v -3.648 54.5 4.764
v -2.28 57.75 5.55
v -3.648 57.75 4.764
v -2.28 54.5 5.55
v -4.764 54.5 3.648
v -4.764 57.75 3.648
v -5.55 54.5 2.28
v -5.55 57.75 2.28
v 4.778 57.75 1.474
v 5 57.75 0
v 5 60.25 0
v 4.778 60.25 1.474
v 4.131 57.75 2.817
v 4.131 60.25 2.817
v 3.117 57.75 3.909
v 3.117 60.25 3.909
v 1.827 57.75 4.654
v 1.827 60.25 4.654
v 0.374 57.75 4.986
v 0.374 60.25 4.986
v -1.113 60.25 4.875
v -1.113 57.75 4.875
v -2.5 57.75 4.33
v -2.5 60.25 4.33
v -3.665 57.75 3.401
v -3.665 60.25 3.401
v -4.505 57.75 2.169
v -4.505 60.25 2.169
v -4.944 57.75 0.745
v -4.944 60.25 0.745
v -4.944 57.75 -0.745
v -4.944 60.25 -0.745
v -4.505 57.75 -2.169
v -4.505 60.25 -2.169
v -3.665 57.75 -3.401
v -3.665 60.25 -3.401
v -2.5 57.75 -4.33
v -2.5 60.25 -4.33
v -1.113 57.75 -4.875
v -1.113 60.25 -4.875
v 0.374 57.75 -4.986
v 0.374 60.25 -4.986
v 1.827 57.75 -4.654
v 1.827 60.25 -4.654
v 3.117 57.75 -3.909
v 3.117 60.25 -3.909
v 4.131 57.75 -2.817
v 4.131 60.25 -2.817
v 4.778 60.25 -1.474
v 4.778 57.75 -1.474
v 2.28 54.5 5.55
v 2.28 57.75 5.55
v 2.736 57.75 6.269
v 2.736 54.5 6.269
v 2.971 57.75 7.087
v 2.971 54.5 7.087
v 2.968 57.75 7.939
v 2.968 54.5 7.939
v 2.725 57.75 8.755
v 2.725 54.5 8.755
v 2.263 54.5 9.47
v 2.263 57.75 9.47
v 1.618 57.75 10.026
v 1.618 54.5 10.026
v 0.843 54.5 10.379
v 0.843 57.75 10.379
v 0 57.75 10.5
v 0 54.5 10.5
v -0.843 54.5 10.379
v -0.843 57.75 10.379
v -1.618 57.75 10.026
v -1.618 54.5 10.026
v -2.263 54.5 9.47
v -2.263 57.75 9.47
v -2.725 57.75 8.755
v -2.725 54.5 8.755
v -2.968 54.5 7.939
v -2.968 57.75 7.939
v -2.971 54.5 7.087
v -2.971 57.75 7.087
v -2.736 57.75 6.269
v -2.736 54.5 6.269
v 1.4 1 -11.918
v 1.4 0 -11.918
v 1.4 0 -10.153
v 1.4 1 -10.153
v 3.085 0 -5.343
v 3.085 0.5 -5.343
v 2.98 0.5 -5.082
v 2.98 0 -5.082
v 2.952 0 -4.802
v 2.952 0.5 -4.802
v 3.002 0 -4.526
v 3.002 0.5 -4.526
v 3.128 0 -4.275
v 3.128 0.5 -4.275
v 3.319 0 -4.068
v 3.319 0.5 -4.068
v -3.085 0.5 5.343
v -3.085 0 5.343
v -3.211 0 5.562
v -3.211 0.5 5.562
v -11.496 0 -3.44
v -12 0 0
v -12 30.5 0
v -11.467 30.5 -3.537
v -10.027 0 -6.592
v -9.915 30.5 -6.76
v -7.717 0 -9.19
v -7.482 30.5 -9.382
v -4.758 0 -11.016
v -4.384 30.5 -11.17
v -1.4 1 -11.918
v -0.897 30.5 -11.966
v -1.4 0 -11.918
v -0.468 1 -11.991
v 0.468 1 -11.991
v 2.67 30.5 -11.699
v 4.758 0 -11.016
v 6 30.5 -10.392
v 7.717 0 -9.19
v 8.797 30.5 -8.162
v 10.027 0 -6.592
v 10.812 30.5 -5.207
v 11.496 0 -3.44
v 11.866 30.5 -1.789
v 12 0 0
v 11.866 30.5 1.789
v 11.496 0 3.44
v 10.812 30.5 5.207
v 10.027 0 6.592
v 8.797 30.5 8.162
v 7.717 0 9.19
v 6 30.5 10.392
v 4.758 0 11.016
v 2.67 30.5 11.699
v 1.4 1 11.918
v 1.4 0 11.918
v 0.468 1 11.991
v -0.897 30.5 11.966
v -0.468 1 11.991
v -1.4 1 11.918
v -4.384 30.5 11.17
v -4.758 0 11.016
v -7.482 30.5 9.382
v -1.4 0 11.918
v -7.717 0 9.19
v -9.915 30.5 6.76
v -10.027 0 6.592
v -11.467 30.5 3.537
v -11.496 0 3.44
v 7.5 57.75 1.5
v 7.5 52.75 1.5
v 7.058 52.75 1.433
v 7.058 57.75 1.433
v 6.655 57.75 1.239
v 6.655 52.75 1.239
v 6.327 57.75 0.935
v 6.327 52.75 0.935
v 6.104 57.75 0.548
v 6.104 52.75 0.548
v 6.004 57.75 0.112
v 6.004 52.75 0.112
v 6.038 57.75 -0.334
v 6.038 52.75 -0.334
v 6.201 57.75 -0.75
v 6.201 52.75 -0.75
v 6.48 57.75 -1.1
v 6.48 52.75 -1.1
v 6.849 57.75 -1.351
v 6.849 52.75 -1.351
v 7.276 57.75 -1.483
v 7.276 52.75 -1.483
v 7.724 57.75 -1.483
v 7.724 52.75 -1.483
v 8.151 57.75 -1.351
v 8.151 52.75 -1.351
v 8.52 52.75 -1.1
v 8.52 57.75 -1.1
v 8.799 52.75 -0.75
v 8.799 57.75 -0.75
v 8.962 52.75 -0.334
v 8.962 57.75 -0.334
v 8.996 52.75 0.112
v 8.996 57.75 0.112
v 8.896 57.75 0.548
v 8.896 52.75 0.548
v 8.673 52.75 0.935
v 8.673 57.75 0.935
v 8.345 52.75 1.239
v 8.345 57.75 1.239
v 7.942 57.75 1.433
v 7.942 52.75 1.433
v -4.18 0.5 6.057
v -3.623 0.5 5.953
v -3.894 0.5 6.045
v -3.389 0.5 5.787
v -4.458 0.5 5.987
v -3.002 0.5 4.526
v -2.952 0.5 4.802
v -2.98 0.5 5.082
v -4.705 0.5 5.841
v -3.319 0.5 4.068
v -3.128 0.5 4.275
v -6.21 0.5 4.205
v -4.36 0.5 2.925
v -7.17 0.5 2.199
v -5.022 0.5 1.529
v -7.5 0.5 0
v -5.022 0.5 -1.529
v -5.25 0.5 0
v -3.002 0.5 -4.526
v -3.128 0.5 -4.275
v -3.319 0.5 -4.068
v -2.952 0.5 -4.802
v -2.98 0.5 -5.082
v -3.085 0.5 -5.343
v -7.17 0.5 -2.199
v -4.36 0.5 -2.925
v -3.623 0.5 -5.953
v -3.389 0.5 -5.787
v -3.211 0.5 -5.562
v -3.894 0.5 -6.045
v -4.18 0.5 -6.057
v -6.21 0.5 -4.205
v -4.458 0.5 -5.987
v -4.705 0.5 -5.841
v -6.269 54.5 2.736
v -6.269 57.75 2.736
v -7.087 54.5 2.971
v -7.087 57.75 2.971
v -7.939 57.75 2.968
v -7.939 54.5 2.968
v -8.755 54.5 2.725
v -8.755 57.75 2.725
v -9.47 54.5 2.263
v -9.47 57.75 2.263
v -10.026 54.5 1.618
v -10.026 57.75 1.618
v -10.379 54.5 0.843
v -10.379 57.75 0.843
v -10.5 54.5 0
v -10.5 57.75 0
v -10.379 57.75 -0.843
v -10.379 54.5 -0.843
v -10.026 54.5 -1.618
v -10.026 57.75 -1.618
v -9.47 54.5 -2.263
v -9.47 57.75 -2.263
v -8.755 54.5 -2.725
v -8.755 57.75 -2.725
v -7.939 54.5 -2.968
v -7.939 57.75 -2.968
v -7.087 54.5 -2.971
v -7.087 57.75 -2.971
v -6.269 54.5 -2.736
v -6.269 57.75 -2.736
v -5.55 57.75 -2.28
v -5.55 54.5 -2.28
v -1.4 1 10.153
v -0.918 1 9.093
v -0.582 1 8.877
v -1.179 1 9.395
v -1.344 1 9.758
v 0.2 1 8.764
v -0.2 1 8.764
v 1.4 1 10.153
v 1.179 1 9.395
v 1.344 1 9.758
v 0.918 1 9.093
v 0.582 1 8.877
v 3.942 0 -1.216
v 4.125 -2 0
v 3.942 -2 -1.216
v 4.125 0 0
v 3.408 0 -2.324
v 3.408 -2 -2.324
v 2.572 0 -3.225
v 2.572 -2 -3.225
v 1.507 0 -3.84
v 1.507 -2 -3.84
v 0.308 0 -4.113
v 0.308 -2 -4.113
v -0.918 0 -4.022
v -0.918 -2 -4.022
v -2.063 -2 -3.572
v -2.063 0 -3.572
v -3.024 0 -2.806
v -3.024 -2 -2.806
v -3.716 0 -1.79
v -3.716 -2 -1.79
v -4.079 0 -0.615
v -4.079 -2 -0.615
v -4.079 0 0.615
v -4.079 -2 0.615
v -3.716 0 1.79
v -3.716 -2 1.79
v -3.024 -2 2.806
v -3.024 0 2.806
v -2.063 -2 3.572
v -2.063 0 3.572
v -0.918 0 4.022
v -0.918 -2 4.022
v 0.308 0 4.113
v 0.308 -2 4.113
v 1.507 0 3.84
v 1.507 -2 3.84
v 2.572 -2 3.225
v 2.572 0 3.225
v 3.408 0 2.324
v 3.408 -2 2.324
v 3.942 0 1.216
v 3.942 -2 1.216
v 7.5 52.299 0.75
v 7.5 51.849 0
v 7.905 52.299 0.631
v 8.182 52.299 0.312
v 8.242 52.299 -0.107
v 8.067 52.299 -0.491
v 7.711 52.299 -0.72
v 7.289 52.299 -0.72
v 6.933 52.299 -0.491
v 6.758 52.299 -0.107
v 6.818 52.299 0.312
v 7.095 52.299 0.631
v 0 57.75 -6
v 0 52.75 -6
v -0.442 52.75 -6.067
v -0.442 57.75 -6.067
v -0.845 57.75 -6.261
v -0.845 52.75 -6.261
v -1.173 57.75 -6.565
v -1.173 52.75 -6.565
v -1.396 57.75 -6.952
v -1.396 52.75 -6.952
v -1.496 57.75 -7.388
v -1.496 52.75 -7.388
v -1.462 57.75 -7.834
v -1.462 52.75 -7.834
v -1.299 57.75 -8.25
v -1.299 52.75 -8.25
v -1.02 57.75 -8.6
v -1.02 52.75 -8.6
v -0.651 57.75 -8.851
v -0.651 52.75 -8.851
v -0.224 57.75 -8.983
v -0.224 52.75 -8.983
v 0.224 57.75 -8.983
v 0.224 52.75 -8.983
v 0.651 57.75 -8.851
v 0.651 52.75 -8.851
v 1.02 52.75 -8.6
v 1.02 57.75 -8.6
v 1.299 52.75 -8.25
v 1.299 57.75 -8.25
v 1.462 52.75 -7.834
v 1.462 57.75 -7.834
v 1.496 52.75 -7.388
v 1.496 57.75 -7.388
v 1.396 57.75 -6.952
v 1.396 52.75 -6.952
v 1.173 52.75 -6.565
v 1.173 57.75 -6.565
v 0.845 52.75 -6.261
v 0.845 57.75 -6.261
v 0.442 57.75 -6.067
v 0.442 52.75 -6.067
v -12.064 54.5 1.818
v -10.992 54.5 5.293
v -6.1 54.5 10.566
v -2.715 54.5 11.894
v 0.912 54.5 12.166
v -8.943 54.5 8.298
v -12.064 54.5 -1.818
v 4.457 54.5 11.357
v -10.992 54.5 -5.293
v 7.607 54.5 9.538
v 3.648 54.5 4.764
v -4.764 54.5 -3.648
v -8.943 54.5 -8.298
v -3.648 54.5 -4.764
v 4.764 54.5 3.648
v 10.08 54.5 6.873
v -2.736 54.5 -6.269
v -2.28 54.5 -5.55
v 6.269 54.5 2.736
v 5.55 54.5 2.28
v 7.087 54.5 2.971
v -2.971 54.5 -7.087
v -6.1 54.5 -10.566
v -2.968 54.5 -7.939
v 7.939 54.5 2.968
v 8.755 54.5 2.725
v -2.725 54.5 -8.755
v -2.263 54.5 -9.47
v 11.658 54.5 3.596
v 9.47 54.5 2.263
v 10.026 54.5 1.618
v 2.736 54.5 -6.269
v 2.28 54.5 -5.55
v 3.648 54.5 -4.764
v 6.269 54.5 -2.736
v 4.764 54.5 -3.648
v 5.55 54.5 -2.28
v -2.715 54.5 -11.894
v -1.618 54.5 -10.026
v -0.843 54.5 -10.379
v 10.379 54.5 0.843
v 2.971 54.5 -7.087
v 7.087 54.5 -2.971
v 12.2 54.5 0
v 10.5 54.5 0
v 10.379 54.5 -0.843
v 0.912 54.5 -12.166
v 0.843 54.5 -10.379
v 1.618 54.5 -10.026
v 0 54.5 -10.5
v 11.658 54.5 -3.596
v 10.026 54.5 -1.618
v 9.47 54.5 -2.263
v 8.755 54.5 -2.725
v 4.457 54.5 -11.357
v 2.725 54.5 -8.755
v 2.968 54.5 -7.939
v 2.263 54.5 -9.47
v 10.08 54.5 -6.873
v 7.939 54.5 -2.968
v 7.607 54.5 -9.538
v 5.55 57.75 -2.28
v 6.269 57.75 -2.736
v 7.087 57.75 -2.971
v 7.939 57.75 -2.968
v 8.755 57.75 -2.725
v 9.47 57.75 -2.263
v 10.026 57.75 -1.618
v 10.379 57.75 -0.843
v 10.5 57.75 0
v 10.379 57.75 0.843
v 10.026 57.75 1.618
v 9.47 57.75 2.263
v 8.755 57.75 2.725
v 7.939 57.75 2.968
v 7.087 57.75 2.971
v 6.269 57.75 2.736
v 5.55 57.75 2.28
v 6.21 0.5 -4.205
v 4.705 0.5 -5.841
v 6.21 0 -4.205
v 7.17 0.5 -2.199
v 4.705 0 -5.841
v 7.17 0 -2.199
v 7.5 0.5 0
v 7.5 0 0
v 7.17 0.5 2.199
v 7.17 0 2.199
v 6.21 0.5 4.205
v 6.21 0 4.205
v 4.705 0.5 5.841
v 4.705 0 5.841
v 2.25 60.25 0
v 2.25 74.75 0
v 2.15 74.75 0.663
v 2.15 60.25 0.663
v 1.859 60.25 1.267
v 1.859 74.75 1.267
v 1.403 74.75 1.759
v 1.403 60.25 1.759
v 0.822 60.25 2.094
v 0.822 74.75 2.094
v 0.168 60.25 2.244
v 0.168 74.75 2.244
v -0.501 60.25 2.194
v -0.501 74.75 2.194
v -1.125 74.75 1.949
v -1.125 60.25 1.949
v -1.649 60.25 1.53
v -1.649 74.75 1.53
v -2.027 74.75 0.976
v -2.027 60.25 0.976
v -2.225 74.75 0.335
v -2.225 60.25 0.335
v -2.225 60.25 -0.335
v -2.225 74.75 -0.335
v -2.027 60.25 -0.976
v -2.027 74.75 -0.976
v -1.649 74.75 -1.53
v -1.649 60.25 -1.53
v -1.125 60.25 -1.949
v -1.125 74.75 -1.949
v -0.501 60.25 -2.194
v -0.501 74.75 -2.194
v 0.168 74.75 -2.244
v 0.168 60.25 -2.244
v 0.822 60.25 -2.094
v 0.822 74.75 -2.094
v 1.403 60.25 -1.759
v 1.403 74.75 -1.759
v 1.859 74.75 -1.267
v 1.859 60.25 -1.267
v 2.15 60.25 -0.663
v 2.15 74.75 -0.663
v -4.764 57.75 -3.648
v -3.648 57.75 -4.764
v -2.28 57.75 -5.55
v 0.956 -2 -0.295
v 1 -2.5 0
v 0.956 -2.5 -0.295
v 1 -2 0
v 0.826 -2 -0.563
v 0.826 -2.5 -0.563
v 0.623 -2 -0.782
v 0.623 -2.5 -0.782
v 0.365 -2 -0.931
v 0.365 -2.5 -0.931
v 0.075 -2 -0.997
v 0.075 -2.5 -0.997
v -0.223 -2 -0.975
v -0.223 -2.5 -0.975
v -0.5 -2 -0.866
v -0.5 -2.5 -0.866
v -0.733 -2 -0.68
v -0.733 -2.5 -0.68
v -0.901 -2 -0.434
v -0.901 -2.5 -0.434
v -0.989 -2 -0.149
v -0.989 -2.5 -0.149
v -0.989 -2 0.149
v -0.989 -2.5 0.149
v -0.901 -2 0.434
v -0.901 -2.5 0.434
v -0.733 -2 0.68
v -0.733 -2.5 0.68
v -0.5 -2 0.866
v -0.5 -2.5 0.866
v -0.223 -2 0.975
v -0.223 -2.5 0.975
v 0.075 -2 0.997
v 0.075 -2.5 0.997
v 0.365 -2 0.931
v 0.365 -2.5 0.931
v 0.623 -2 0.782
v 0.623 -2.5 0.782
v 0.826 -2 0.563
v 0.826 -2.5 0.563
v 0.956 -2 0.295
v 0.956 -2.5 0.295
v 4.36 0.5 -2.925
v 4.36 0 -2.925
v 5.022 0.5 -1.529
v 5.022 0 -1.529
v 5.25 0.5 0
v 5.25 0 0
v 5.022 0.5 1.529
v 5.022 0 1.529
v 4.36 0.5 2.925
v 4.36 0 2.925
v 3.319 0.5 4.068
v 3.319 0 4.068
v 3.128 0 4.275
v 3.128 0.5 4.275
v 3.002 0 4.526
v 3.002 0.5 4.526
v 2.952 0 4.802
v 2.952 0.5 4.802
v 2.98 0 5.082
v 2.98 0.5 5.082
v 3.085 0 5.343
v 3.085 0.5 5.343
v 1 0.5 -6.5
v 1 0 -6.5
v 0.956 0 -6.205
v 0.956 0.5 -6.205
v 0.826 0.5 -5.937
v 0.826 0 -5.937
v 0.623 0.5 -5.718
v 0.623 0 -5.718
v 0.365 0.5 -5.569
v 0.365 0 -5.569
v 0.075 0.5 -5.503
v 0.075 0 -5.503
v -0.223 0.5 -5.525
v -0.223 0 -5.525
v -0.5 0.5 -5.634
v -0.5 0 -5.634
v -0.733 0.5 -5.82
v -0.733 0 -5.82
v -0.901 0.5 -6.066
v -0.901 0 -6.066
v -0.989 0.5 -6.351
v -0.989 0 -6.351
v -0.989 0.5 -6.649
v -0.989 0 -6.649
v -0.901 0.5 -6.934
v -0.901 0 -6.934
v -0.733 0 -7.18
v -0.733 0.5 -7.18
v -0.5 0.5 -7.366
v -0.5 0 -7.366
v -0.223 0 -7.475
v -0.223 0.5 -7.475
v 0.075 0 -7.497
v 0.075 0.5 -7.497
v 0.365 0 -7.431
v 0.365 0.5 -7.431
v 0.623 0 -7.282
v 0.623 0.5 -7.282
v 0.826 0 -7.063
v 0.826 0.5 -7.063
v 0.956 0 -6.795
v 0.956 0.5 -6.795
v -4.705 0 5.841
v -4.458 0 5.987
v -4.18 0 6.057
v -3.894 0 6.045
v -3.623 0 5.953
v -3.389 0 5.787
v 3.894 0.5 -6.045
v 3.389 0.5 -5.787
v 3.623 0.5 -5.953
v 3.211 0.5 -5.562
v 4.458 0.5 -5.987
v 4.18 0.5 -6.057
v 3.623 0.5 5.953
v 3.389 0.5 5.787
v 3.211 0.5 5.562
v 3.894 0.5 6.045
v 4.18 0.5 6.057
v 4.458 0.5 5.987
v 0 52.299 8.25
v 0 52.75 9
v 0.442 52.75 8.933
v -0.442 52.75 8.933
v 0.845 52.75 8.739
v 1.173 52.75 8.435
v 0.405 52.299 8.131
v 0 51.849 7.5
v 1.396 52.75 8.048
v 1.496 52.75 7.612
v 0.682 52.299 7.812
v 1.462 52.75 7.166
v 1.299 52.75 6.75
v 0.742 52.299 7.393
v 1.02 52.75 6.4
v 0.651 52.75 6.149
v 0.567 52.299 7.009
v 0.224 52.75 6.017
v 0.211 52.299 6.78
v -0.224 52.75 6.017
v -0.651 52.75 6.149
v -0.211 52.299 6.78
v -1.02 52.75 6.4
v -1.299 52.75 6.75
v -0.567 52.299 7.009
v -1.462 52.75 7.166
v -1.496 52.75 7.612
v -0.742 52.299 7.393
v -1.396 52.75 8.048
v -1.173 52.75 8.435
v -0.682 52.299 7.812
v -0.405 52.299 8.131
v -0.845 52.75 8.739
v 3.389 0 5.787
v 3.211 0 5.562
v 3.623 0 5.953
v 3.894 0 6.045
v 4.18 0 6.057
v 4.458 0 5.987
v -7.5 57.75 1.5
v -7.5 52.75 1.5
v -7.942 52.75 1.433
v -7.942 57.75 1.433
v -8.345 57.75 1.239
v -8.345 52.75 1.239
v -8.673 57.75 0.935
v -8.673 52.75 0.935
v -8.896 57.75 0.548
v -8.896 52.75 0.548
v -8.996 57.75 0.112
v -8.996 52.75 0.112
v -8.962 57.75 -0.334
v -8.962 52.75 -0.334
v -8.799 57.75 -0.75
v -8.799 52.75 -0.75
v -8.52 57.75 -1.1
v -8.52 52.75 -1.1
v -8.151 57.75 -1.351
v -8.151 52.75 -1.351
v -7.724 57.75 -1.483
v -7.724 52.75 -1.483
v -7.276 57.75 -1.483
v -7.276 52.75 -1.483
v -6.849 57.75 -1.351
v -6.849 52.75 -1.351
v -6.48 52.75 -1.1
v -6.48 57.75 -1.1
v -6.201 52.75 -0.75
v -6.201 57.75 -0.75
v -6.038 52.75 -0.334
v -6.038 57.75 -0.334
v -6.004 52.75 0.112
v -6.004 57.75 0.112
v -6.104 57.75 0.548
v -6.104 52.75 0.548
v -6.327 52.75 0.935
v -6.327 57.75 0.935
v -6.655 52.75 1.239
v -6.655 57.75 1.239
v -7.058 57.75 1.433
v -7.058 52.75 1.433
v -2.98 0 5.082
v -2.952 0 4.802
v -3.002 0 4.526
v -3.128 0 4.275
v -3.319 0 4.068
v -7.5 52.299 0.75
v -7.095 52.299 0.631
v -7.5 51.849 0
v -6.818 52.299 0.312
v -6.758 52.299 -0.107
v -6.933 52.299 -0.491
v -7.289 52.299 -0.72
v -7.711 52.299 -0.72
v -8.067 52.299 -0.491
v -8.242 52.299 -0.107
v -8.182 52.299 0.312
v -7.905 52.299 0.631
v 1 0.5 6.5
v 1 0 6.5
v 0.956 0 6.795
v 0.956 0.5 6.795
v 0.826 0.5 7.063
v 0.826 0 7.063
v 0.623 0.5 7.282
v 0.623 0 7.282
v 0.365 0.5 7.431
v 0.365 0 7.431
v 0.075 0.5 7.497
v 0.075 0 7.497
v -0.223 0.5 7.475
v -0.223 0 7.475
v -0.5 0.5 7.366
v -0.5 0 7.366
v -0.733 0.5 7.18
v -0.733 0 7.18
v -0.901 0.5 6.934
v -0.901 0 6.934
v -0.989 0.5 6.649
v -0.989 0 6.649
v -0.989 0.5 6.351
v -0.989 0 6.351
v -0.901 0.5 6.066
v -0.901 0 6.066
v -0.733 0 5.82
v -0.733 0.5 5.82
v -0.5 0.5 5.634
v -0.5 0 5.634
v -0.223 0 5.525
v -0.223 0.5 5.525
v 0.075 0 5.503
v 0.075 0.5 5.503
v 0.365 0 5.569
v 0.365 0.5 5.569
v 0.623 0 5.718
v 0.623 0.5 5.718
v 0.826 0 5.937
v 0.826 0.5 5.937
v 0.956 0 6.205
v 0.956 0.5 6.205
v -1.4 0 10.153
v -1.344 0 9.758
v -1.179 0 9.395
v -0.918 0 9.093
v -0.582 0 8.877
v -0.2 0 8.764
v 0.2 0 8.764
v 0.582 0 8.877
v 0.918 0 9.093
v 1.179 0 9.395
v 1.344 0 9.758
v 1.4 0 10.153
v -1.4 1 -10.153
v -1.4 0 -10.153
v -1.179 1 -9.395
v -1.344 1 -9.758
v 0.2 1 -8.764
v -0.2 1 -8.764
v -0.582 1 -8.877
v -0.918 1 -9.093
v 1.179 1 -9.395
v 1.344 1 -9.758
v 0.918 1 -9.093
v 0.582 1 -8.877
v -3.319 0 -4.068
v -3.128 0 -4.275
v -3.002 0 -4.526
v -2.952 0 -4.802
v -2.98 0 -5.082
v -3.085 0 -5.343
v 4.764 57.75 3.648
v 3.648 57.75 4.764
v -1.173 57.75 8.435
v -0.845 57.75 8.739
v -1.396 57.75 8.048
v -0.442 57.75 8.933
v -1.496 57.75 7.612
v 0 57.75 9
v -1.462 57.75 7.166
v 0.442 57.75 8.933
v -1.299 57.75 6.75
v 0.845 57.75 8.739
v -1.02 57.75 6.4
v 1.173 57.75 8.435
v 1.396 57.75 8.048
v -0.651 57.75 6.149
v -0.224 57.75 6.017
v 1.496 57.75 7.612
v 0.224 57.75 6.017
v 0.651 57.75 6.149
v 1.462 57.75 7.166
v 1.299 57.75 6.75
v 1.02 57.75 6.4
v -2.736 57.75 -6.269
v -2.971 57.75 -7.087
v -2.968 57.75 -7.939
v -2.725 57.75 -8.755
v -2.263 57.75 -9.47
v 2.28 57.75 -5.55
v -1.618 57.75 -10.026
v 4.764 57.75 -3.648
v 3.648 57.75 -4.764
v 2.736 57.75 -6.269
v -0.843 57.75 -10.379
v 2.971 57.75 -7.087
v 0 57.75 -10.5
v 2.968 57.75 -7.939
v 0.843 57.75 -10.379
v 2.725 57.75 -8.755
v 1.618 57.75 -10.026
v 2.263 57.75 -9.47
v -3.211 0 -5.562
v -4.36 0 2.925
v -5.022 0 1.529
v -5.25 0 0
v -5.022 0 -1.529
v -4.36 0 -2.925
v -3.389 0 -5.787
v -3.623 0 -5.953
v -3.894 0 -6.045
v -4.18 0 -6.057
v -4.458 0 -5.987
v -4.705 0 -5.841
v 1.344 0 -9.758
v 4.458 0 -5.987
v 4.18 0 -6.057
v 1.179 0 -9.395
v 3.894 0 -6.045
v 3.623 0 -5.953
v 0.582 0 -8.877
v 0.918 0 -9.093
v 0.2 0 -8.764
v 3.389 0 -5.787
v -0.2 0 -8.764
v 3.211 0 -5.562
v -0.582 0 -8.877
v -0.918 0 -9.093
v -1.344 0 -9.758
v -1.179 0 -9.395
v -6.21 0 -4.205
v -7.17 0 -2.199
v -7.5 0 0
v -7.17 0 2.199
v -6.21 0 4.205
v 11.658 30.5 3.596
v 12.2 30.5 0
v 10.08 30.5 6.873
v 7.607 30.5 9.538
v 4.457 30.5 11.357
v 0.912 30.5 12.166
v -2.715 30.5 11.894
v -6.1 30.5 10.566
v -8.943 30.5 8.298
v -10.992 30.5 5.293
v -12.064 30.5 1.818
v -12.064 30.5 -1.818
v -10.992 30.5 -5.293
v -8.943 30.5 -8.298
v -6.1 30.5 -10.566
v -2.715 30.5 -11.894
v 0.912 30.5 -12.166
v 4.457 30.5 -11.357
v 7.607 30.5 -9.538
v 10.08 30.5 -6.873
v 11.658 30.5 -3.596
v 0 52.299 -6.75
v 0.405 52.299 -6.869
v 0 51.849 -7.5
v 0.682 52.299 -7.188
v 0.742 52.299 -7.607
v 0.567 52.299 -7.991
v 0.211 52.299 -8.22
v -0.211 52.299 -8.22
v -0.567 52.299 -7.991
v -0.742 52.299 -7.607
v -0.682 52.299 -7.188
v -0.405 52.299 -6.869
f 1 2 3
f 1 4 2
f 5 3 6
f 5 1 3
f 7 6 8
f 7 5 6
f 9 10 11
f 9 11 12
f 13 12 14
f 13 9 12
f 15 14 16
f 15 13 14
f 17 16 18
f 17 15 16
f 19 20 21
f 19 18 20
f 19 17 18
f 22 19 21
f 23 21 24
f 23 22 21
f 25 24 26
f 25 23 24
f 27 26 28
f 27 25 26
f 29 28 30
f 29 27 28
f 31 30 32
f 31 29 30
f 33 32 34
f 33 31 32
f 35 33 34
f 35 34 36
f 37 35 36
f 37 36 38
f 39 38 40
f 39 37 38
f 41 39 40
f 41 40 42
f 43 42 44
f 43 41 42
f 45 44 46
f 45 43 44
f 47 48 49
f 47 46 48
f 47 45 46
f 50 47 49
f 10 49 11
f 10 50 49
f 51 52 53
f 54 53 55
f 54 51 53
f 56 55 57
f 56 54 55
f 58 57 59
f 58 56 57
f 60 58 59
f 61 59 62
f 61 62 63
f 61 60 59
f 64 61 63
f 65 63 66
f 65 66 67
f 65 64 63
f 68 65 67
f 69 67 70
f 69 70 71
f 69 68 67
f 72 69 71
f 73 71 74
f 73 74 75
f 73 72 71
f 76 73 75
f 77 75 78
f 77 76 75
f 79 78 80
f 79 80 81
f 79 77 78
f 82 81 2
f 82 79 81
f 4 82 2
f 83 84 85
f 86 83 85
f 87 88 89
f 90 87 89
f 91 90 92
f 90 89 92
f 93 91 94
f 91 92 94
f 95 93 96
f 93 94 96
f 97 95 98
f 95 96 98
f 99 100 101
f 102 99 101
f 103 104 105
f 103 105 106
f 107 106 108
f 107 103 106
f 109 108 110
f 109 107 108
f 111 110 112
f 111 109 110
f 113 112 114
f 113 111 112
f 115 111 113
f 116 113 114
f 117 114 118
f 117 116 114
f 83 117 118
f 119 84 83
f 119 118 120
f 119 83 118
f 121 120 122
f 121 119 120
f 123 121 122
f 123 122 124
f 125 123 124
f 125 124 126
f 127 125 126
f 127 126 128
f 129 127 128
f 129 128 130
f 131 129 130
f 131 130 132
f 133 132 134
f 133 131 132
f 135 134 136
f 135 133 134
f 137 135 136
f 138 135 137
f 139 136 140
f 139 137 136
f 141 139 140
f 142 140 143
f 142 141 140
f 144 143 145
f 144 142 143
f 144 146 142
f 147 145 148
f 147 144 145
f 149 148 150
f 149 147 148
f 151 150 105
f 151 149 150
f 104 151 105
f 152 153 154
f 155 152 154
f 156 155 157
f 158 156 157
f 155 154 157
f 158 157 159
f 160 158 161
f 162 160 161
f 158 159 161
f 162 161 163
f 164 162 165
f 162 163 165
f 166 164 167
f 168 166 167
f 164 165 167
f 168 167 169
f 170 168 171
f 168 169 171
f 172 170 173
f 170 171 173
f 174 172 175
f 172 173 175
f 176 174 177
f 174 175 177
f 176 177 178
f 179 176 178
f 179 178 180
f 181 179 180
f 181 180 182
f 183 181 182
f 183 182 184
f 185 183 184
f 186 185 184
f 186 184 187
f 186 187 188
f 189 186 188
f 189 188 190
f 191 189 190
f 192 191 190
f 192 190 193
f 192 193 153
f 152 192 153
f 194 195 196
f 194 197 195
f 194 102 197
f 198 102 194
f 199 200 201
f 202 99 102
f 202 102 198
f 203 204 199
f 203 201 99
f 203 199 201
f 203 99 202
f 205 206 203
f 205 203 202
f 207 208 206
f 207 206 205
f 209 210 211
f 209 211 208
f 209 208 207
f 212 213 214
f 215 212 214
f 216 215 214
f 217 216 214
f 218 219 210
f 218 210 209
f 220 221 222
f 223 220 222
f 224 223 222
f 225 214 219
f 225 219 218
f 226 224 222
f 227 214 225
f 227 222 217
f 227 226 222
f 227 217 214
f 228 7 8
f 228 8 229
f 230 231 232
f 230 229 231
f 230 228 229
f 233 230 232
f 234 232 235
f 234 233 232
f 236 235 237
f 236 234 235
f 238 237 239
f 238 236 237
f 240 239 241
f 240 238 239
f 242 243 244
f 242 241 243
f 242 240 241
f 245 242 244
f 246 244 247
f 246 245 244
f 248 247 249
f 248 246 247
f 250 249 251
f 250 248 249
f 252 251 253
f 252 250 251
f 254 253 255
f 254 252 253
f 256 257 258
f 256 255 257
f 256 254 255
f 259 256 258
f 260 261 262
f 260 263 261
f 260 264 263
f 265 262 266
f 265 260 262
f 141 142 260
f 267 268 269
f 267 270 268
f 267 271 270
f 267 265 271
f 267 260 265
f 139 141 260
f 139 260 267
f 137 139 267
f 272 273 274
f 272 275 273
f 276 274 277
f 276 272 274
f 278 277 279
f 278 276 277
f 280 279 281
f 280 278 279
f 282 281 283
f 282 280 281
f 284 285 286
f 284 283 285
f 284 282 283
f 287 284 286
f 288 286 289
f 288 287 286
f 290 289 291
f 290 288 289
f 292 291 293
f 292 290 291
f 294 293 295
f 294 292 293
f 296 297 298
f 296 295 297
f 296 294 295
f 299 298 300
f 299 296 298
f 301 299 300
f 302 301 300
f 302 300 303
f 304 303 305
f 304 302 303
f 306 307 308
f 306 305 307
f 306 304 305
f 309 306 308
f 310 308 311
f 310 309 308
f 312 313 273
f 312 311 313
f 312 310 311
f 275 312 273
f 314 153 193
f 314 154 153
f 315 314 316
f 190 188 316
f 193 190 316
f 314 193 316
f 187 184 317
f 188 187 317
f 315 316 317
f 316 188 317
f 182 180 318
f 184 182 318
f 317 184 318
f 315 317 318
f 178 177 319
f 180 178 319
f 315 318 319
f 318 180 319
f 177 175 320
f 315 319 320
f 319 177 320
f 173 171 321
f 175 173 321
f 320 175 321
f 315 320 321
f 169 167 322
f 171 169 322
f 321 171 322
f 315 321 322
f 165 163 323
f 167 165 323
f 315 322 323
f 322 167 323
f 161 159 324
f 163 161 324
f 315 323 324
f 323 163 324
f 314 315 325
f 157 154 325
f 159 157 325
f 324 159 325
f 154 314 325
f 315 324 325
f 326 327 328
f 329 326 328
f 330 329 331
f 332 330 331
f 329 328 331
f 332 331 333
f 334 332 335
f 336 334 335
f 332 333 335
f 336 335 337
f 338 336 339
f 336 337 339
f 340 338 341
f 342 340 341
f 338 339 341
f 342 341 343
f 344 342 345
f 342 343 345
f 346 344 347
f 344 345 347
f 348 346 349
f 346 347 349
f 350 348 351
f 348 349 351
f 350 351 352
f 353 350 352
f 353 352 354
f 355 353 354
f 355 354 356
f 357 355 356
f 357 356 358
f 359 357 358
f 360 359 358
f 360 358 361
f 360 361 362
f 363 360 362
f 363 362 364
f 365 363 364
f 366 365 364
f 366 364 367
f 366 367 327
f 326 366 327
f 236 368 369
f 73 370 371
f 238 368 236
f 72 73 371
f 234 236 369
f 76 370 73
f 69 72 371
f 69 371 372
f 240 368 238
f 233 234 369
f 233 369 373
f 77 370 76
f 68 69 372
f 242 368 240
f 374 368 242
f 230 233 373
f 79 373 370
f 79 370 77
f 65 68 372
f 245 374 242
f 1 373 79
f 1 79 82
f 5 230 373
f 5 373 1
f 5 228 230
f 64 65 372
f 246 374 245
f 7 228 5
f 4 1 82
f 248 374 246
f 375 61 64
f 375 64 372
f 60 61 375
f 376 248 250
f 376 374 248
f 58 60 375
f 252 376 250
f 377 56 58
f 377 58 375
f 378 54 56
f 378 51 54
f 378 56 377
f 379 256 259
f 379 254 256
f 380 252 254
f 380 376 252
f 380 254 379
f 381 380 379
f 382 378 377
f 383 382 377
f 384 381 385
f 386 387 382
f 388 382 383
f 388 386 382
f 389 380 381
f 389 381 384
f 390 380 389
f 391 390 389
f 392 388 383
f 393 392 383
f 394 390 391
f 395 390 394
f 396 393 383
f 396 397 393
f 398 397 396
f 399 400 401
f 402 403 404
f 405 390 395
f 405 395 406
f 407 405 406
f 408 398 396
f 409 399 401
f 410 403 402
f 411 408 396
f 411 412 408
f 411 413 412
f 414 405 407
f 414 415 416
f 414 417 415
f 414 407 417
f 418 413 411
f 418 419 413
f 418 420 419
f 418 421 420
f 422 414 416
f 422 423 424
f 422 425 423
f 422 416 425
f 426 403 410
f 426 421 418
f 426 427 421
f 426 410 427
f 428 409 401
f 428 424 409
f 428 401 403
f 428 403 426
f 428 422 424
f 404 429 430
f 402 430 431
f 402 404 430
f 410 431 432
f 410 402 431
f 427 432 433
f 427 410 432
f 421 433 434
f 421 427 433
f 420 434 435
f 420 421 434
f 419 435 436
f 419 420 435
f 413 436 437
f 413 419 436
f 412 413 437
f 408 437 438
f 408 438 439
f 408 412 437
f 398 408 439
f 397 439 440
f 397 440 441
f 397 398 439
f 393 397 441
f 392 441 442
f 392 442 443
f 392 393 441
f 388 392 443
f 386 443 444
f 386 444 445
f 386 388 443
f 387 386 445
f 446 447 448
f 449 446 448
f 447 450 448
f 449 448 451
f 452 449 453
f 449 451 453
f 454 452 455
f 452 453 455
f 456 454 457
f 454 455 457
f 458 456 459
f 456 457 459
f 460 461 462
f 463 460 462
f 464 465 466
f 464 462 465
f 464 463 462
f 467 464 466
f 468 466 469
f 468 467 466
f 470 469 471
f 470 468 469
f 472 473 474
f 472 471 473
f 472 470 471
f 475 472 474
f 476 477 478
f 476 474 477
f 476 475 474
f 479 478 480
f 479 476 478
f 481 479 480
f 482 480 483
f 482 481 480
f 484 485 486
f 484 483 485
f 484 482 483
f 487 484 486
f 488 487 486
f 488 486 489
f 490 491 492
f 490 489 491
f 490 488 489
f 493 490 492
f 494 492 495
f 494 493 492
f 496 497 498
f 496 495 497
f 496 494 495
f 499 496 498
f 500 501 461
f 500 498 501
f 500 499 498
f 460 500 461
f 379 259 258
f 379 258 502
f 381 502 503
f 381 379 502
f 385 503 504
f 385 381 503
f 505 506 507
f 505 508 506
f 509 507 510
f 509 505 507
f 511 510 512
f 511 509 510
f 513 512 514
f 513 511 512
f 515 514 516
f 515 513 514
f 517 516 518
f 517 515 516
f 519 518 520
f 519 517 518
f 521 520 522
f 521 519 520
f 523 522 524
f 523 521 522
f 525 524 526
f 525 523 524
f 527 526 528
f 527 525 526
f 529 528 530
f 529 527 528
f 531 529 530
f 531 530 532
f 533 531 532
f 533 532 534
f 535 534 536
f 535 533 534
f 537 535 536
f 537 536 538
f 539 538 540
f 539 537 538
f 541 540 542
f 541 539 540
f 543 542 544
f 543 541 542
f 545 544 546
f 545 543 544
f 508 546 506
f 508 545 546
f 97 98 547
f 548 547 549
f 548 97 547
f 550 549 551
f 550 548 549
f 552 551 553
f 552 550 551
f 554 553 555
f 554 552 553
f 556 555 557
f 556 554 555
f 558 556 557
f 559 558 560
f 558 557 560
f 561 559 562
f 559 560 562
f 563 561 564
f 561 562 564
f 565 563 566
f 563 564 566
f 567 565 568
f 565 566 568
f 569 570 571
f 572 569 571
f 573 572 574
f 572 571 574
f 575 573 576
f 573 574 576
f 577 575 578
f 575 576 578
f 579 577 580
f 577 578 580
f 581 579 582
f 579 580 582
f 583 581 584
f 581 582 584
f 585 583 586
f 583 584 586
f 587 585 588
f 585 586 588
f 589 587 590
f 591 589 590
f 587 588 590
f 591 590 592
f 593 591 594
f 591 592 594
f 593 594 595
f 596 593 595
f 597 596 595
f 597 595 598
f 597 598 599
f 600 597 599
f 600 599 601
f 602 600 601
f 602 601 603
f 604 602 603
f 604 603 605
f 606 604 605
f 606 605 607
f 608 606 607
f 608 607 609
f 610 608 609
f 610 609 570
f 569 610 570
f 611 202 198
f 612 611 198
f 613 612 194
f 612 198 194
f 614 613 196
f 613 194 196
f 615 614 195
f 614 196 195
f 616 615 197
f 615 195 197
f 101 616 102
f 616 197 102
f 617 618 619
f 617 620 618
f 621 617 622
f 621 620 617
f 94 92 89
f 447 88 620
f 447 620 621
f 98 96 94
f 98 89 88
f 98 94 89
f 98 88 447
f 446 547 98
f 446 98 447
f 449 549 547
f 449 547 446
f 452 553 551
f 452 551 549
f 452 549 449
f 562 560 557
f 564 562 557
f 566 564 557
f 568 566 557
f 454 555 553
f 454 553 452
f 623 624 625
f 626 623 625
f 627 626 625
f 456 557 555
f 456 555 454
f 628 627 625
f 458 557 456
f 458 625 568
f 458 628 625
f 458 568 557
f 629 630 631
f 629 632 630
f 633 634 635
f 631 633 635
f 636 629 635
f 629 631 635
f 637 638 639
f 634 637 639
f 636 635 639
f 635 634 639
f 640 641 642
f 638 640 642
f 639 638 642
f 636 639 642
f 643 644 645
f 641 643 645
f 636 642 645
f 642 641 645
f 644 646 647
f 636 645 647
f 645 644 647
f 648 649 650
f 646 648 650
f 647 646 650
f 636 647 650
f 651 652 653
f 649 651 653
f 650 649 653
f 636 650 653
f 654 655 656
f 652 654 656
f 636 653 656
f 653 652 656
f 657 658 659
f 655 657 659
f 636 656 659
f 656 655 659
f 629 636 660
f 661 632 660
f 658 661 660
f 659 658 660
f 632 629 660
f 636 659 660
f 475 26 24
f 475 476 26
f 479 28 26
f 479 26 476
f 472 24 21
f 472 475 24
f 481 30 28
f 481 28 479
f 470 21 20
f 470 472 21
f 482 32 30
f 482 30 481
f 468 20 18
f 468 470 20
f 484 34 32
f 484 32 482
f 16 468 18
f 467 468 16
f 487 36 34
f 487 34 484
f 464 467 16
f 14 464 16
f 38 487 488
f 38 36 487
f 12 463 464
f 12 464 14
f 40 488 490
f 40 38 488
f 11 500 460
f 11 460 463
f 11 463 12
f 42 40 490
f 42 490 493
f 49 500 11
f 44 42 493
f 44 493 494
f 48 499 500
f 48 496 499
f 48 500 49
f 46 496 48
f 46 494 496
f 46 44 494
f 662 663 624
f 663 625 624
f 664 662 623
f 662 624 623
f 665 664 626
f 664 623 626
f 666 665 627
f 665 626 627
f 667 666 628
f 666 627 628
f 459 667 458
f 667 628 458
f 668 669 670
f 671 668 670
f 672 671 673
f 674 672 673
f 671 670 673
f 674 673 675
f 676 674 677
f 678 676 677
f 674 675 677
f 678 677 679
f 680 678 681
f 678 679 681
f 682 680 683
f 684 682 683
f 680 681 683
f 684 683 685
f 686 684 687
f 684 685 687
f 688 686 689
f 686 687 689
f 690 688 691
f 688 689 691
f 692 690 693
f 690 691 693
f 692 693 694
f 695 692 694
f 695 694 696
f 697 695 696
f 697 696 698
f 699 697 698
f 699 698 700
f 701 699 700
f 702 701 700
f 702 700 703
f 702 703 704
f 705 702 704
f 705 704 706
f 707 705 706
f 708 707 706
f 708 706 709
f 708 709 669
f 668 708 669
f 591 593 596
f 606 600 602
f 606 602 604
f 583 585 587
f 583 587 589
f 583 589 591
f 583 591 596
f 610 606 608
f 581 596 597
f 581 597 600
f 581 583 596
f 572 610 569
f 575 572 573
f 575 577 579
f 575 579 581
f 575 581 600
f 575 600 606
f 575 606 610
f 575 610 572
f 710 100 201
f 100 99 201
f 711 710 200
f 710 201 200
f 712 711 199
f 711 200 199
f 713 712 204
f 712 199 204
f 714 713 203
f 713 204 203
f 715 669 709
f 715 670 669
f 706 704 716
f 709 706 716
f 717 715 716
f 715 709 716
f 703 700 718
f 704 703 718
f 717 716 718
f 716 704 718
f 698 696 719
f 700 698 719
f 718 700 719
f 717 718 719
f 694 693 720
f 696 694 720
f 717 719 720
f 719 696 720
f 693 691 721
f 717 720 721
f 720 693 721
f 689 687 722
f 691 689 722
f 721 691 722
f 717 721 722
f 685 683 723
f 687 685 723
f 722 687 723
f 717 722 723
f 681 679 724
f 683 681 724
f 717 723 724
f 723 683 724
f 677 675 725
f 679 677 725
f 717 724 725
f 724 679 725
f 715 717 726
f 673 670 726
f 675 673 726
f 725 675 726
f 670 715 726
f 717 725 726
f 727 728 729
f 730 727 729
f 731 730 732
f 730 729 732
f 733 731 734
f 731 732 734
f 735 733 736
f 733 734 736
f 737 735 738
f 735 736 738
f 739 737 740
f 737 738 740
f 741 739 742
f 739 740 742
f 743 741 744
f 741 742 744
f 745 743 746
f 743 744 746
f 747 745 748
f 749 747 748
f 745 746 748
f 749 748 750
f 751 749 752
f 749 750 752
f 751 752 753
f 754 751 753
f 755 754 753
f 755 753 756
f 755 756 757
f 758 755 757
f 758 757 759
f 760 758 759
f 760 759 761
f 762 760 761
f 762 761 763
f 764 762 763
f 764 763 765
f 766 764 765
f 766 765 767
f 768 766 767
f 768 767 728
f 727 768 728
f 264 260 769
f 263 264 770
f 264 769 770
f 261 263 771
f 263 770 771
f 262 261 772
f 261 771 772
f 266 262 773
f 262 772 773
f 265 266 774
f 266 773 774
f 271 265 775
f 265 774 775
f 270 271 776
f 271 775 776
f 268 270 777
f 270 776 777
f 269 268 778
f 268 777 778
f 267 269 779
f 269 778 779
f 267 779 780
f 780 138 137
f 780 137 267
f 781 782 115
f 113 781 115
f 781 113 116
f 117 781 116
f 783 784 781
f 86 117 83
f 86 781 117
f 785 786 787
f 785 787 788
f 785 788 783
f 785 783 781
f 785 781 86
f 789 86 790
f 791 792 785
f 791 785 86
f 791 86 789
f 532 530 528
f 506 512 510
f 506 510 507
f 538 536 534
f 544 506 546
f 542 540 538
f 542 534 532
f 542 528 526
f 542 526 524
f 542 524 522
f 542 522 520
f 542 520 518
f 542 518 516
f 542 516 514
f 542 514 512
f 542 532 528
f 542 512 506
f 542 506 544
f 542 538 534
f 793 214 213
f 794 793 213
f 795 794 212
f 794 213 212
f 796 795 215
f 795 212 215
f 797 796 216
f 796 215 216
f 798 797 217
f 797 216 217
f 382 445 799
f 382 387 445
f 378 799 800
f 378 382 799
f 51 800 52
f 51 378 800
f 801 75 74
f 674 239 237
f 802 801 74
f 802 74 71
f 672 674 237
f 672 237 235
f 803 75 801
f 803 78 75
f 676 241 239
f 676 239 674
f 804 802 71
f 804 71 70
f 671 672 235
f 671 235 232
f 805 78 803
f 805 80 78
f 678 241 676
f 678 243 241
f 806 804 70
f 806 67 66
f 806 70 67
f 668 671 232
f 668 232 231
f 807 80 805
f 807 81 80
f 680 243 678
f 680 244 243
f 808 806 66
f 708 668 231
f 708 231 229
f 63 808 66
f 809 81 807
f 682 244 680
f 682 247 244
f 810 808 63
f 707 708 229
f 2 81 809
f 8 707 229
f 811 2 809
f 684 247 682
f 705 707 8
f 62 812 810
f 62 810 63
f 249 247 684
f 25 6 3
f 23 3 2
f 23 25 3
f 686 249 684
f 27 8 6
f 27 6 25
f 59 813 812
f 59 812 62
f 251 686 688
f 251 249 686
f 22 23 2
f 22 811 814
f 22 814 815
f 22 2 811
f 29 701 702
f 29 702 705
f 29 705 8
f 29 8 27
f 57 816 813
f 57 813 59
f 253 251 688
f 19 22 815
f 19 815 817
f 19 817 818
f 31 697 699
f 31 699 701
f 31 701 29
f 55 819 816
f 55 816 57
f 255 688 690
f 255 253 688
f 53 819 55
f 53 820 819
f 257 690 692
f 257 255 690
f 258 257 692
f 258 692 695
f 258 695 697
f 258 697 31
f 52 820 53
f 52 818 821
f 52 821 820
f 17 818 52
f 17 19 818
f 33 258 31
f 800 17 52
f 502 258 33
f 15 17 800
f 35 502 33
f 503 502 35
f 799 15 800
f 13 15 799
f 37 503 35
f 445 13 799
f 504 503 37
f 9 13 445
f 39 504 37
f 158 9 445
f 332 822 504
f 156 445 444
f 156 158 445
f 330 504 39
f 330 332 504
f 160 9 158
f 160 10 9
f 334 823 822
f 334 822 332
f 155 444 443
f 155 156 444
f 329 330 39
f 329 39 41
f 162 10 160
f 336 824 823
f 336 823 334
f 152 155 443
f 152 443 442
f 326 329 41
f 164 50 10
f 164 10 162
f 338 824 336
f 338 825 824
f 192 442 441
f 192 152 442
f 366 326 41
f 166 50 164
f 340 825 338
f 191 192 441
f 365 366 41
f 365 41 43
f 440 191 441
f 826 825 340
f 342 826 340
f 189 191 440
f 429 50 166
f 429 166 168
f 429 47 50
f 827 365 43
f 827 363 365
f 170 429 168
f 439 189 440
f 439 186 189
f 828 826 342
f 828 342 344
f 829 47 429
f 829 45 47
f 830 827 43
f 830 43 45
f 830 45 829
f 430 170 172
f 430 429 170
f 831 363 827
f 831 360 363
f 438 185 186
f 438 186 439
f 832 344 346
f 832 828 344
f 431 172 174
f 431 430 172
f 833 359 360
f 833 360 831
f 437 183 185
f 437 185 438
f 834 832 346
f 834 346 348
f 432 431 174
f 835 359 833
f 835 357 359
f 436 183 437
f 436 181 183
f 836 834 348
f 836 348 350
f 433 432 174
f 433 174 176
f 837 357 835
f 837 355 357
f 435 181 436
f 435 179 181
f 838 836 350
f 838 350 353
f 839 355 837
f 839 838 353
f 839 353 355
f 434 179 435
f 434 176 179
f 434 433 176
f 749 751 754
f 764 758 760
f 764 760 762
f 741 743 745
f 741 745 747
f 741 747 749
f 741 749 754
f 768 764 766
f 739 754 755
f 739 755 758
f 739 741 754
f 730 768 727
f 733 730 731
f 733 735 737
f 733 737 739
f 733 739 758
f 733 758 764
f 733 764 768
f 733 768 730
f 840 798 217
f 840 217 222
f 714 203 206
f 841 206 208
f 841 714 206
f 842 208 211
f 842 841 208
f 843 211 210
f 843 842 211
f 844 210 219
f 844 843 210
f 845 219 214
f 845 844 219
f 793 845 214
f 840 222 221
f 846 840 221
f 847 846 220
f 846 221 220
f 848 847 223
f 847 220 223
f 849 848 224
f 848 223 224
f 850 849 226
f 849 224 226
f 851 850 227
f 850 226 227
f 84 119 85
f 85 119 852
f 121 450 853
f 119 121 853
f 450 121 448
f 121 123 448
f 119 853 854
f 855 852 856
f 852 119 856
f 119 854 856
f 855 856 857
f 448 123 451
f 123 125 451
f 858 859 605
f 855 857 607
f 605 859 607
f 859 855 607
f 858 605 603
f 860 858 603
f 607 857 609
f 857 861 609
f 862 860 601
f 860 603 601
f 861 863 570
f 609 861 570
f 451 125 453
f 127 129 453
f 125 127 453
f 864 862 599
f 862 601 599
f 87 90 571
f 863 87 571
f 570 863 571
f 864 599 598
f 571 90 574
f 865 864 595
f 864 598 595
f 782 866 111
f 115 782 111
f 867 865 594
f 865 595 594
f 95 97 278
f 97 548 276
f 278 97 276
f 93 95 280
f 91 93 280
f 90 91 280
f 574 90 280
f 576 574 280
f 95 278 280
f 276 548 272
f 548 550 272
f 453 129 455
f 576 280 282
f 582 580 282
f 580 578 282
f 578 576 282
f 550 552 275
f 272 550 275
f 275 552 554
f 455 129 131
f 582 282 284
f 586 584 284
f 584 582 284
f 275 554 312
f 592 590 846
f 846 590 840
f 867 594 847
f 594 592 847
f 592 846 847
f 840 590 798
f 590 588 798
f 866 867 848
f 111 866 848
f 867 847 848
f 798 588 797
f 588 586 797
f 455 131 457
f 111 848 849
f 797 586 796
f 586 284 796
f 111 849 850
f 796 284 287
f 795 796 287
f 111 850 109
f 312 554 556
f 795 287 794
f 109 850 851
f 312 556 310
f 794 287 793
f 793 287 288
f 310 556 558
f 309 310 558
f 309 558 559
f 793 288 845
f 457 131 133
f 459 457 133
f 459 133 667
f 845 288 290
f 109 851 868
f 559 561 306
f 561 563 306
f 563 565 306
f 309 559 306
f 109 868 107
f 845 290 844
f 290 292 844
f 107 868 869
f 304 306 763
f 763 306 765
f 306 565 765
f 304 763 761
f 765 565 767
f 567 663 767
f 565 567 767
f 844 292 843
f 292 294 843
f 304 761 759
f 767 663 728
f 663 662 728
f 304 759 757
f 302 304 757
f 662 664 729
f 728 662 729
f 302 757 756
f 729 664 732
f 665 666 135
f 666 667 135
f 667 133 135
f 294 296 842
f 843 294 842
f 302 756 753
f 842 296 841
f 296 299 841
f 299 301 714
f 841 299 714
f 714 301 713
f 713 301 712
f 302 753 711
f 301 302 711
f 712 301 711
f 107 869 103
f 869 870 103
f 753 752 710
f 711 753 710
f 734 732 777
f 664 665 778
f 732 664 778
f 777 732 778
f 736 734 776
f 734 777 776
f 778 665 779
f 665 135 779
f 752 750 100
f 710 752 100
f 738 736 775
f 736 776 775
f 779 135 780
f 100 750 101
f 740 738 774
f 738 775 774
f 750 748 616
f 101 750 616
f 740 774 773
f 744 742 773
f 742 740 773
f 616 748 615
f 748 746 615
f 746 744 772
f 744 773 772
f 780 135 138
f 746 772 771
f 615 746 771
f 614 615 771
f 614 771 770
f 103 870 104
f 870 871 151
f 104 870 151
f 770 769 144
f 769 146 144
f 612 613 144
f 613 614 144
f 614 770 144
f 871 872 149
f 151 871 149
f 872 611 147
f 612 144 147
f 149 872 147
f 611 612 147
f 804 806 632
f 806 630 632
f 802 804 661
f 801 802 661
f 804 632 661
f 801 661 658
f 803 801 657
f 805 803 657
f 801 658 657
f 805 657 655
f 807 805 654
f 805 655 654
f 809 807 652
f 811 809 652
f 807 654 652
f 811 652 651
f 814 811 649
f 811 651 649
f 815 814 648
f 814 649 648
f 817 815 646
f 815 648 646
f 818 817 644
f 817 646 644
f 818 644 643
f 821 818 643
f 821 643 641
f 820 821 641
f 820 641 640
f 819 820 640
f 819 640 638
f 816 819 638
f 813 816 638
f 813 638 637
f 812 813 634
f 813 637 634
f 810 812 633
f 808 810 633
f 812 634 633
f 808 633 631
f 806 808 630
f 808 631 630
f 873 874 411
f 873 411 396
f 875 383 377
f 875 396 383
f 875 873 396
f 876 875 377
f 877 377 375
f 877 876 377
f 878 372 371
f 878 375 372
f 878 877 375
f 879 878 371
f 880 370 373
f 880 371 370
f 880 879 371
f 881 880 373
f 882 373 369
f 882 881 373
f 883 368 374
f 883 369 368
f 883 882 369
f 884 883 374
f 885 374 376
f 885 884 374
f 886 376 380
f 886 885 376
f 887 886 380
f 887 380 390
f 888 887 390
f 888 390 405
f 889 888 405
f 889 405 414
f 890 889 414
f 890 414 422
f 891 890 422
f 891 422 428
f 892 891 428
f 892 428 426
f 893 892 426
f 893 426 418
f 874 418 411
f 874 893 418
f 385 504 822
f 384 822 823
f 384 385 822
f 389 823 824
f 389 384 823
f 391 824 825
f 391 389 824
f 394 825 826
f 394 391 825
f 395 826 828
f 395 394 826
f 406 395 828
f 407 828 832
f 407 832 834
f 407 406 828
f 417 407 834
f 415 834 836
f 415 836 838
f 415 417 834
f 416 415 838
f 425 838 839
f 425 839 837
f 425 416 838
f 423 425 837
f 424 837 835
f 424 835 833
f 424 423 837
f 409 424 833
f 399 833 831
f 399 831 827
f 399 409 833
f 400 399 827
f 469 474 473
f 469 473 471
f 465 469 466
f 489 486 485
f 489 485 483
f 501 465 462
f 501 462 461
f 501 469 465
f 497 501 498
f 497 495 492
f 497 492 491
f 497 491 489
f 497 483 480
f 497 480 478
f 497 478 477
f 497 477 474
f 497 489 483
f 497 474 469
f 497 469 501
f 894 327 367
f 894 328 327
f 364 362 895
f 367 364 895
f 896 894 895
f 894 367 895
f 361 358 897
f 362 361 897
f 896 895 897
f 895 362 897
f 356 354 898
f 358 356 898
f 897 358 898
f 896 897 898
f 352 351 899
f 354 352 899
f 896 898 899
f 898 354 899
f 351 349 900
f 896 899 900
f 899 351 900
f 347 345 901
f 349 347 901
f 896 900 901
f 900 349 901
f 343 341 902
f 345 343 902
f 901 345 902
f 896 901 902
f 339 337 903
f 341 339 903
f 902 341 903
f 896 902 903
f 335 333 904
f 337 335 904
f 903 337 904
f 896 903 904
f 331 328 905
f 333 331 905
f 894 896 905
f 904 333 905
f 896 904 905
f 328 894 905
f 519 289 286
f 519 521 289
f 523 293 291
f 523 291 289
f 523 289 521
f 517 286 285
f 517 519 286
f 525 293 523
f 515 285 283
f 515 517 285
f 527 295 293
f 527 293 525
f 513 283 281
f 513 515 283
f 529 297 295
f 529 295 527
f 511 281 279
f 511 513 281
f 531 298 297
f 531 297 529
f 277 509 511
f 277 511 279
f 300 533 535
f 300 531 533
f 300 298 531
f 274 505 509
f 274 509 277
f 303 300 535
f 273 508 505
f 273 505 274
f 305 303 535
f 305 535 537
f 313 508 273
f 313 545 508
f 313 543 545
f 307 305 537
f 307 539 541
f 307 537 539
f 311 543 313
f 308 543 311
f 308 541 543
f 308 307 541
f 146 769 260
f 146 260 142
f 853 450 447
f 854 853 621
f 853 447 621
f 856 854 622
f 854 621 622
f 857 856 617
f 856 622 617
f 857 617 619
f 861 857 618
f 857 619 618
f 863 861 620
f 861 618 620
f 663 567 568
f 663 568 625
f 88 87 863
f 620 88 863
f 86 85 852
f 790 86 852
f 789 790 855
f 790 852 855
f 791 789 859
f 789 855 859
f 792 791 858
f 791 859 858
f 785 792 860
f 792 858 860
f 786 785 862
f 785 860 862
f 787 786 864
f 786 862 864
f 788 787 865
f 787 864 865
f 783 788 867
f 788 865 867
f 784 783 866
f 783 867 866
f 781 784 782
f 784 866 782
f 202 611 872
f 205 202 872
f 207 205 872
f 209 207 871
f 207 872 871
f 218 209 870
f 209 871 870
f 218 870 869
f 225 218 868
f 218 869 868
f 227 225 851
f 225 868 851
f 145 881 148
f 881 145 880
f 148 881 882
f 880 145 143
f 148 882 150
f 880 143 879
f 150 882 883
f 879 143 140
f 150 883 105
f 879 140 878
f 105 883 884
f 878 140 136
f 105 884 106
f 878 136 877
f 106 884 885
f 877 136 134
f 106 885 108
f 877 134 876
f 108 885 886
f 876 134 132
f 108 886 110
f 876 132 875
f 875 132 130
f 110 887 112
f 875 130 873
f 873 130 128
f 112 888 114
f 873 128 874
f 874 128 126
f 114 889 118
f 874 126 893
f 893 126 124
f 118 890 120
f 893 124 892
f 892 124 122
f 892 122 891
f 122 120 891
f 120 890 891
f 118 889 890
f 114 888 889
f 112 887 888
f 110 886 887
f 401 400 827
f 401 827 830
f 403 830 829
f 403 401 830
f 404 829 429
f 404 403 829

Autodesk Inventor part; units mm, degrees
ref_plane "YZ Plane" through (0, 0, 0) normal (1, 0, 0) x (0, 1, 0)
ref_plane "XZ Plane" through (0, 0, 0) normal (0, 1, 0) x (-1, 0, 0)
ref_plane "XY Plane" through (0, 0, 0) normal (0, 0, 1) x (1, 0, 0)
sketch "Sketch1" plane through (0, 0, 0) normal (0, 1, 0) x (-1, 0, 0)
  circle A0 centre (0, 0) radius 12
  dimension "d0" = 24
extrude "Extrusion1" add sketch "Sketch1" along normal blind 30.5
sketch "Sketch2" plane through (0, 30.5, 0) normal (0, 1, 0) x (1, 0, 0)
  circle A0 centre (0, 0) radius 12 projected
  circle A1 centre (0, 0) radius 12.2
  dimension "d3" = 24.4
extrude "Extrusion2" add sketch "Sketch2" along normal blind 24 contours A0 | A1
sketch "Sketch3" plane through (0, 54.5, 0) normal (0, 1, 0) x (1, 0, 0)
  circle A0 centre (0, 0) radius 6
  dimension "d6" = 12
extrude "Extrusion3" add sketch "Sketch3" along normal blind 3.25
sketch "Sketch4" plane through (0, 54.5, 0) normal (0, 1, 0) x (1, 0, 0)
  circle A0 centre (0, 0) radius 6 projected
  circle A1 centre (0, 0) radius 12.2 projected
  line L0 (0, 0) -> (-7.5, 0)
  circle A2 centre (-7.5, 0) radius 3
  circle A3 centre (0, -7.5) radius 3
  circle A4 centre (7.5, 0) radius 3
  circle A5 centre (0, 7.5) radius 3
  point P0 (-5.55, 2.2798)
  point P1 (-5.55, -2.2798)
  point P2 (2.2798, 5.55)
  point P3 (-2.2798, 5.55)
  point P4 (5.55, -2.2798)
  point P5 (5.55, 2.2798)
  point P6 (-2.2798, -5.55)
  point P7 (2.2798, -5.55)
  dimension "d9" = 7.5
  dimension "d10" = 6
  dimension "d13" = 360
extrude "Extrusion4" add sketch "Sketch4" along normal blind 3.25 contours A0 A4 | A0 A5 | A3 A0 | A0 A2 picked at (7.2585, 0.8906) picked at (-1.2671, 6.9374) picked at (-1.2671, -6.9374)
sketch "Sketch5" plane through (0, 57.75, 0) normal (0, 1, 0) x (1, 0, 0)
  arc A0 (5.55, 2.2798) -> (2.2798, 5.55) centre (0, 0) ccw projected
  arc A1 (2.2798, 5.55) -> (-2.2798, 5.55) centre (0, 7.5) ccw projected
  arc A2 (-2.2798, 5.55) -> (-5.55, 2.2798) centre (0, 0) ccw projected
  arc A3 (-5.55, 2.2798) -> (-5.55, -2.2798) centre (-7.5, 0) ccw projected
  arc A4 (-5.55, -2.2798) -> (-2.2798, -5.55) centre (0, 0) ccw projected
  arc A5 (-2.2798, -5.55) -> (2.2798, -5.55) centre (0, -7.5) ccw projected
  arc A6 (2.2798, -5.55) -> (5.55, -2.2798) centre (0, 0) ccw projected
  arc A7 (5.55, -2.2798) -> (5.55, 2.2798) centre (7.5, 0) ccw projected
hole "Hole1" at (-7.5, 57.75, 0) at (0, 57.75, 7.5) at (7.5, 57.75, 0) at (0, 57.75, -7.5) direction (0, -1, 0) diameter 3 depth 5 tip angle 118
sketch "Sketch6" plane through (0, 57.75, 0) normal (0, 1, 0) x (1, 0, 0)
  circle A0 centre (0, 0) radius 5
  dimension "d24" = 10
extrude "Extrusion5" add sketch "Sketch6" along normal blind 2.5
sketch "Sketch7" plane through (0, 60.25, 0) normal (0, 1, 0) x (1, 0, 0)
  circle A0 centre (0, 0) radius 2.25
  dimension "d27" = 4.5
extrude "Extrusion6" add sketch "Sketch7" along normal blind 14.5
sketch "Sketch8" plane through (0, 0, 0) normal (0, -1, 0) x (1, 0, 0)
  circle A0 centre (0, 0) radius 4.125
  dimension "d30" = 8.25
extrude "Extrusion7" add sketch "Sketch8" along normal blind 2
sketch "Sketch9" plane through (0, -2, 0) normal (0, -1, 0) x (1, 0, 0)
  circle A0 centre (0, 0) radius 4.125 projected
  circle A1 centre (0, 0) radius 1
  dimension "d33" = 2
extrude "Extrusion8" add sketch "Sketch9" along normal blind 0.5 contours A1
sketch "Sketch10" plane through (0, 0, 0) normal (0, -1, 0) x (1, 0, 0)
  circle A0 centre (0, 0) radius 4.125 projected
  circle A1 centre (0, 0) radius 12 projected
  line L0 (0, 0) -> (0, -6.5)
  line L1 (0, 0) -> (0, 6.5)
  circle A2 centre (0, 6.5) radius 1
  circle A3 centre (0, -6.5) radius 1
  dimension "d36" = 6.5
  dimension "d37" = 6.5
  dimension "d38" = 2
  dimension "d39" = 2
extrude "Extrusion9" cut sketch "Sketch10" against normal blind 0.5 contours A3 | A2
sketch "Sketch11" plane through (0, 0, 0) normal (0, -1, 0) x (1, 0, 0)
  circle A0 centre (0, -6.5) radius 1 projected
  circle A1 centre (0, 6.5) radius 1 projected
  circle A2 centre (0, 0) radius 4.125 projected
  circle A3 centre (0, 0) radius 12 projected
  line L0 (0, 0) -> (0, -10.15)
  line L1 (0, 0) -> (0, 10.15)
  circle A4 centre (0, 10.15) radius 1.4
  circle A5 centre (0, -10.15) radius 1.4
  arc A6 (2.2798, 5.55) -> (-2.2798, 5.55) centre (0, 7.5) ccw projected
  line L2 (1.4, 10.1533) -> (-1.4, 10.1533)
  line L3 (-1.4, 10.1533) -> (-1.4, 13.1533)
  line L4 (-1.4, 13.1533) -> (1.4, 13.1533)
  line L5 (1.4, 13.1533) -> (1.4, 10.1533)
  arc A7 (-2.2798, -5.55) -> (2.2798, -5.55) centre (0, -7.5) ccw projected
  line L6 (1.4, -10.1533) -> (-1.4, -10.1533)
  line L7 (-1.4, -10.1533) -> (-1.4, -13.1533)
  line L8 (-1.4, -13.1533) -> (1.4, -13.1533)
  line L9 (1.4, -13.1533) -> (1.4, -10.1533)
  point P0 (-1.4, -10.1533)
  point P1 (-1.4, -11.9181)
  point P2 (1.4, -11.9181)
  point P3 (1.4, 11.9181)
  point P4 (-1.4, 11.9181)
  point P5 (-1.4, 10.1533)
  dimension "d44" = 2.8
  dimension "d45" = 2.8
  dimension "d42" = 10.15
  dimension "d43" = 10.15
  dimension "d46" = 2.8
  dimension "d47" = 3
  dimension "d48" = 2.8
  dimension "d49" = 3
extrude "Extrusion10" cut sketch "Sketch11" against normal blind 1 contours A5 L6 | A7 A5 | L6 A7 | A5 L9 A3 L7 | A3 L5 A4 L3 | A4 L2 | A4 A6 | A6 L2
sketch "Sketch12" plane through (0, 0, 0) normal (0, -1, 0) x (1, 0, 0)
  line L0 (1.4, -10.1533) -> (1.4, -11.9181) projected
  arc A0 (1.4, -11.9181) -> (1.4, 11.9181) centre (0, 0) ccw projected
  line L1 (1.4, 11.9181) -> (1.4, 10.1533) projected
  arc A1 (-1.4, 10.1533) -> (1.4, 10.1533) centre (0, 10.15) ccw projected
  line L2 (-1.4, 10.1533) -> (-1.4, 11.9181) projected
  arc A2 (-1.4, 11.9181) -> (-1.4, -11.9181) centre (0, 0) ccw projected
  line L3 (-1.4, -11.9181) -> (-1.4, -10.1533) projected
  arc A3 (1.4, -10.1533) -> (-1.4, -10.1533) centre (0, -10.15) ccw projected
  circle A4 centre (0, -6.5) radius 1 projected
  circle A5 centre (0, 6.5) radius 1 projected
  circle A6 centre (0, 0) radius 4.125 projected
  circle A7 centre (0, 0) radius 5.25
  circle A8 centre (0, 0) radius 7.5
  line L4 (0, 0) -> (7.5, 0)
  line L5 (0, 0) -> (3.75, -6.4952)
  line L6 (0, 0) -> (3.75, 6.4952)
  point P0 (2.625, 4.5466)
  point P1 (2.625, -4.5466)
  dimension "d52" = 10.5
  dimension "d53" = 15
  dimension "d54" = 60
  dimension "d55" = 60
extrude "Extrusion11" cut sketch "Sketch12" against normal blind 0.5 contours L5 A7 L4 A8 | A8 L4 A7 L6
fillet "Fillet1" radius 1 4 edges at (3.75, 0.25, 6.4952) (2.625, 0.25, 4.5466) (2.625, 0.25, -4.5466) (3.75, 0.25, -6.4952)
pattern_circular "Circular Pattern1" count 2 over 360 about axis through (0, 0, 0) along (0, -1, 0) of "Extrusion11", "Fillet1"
properties part number "motor_2"
